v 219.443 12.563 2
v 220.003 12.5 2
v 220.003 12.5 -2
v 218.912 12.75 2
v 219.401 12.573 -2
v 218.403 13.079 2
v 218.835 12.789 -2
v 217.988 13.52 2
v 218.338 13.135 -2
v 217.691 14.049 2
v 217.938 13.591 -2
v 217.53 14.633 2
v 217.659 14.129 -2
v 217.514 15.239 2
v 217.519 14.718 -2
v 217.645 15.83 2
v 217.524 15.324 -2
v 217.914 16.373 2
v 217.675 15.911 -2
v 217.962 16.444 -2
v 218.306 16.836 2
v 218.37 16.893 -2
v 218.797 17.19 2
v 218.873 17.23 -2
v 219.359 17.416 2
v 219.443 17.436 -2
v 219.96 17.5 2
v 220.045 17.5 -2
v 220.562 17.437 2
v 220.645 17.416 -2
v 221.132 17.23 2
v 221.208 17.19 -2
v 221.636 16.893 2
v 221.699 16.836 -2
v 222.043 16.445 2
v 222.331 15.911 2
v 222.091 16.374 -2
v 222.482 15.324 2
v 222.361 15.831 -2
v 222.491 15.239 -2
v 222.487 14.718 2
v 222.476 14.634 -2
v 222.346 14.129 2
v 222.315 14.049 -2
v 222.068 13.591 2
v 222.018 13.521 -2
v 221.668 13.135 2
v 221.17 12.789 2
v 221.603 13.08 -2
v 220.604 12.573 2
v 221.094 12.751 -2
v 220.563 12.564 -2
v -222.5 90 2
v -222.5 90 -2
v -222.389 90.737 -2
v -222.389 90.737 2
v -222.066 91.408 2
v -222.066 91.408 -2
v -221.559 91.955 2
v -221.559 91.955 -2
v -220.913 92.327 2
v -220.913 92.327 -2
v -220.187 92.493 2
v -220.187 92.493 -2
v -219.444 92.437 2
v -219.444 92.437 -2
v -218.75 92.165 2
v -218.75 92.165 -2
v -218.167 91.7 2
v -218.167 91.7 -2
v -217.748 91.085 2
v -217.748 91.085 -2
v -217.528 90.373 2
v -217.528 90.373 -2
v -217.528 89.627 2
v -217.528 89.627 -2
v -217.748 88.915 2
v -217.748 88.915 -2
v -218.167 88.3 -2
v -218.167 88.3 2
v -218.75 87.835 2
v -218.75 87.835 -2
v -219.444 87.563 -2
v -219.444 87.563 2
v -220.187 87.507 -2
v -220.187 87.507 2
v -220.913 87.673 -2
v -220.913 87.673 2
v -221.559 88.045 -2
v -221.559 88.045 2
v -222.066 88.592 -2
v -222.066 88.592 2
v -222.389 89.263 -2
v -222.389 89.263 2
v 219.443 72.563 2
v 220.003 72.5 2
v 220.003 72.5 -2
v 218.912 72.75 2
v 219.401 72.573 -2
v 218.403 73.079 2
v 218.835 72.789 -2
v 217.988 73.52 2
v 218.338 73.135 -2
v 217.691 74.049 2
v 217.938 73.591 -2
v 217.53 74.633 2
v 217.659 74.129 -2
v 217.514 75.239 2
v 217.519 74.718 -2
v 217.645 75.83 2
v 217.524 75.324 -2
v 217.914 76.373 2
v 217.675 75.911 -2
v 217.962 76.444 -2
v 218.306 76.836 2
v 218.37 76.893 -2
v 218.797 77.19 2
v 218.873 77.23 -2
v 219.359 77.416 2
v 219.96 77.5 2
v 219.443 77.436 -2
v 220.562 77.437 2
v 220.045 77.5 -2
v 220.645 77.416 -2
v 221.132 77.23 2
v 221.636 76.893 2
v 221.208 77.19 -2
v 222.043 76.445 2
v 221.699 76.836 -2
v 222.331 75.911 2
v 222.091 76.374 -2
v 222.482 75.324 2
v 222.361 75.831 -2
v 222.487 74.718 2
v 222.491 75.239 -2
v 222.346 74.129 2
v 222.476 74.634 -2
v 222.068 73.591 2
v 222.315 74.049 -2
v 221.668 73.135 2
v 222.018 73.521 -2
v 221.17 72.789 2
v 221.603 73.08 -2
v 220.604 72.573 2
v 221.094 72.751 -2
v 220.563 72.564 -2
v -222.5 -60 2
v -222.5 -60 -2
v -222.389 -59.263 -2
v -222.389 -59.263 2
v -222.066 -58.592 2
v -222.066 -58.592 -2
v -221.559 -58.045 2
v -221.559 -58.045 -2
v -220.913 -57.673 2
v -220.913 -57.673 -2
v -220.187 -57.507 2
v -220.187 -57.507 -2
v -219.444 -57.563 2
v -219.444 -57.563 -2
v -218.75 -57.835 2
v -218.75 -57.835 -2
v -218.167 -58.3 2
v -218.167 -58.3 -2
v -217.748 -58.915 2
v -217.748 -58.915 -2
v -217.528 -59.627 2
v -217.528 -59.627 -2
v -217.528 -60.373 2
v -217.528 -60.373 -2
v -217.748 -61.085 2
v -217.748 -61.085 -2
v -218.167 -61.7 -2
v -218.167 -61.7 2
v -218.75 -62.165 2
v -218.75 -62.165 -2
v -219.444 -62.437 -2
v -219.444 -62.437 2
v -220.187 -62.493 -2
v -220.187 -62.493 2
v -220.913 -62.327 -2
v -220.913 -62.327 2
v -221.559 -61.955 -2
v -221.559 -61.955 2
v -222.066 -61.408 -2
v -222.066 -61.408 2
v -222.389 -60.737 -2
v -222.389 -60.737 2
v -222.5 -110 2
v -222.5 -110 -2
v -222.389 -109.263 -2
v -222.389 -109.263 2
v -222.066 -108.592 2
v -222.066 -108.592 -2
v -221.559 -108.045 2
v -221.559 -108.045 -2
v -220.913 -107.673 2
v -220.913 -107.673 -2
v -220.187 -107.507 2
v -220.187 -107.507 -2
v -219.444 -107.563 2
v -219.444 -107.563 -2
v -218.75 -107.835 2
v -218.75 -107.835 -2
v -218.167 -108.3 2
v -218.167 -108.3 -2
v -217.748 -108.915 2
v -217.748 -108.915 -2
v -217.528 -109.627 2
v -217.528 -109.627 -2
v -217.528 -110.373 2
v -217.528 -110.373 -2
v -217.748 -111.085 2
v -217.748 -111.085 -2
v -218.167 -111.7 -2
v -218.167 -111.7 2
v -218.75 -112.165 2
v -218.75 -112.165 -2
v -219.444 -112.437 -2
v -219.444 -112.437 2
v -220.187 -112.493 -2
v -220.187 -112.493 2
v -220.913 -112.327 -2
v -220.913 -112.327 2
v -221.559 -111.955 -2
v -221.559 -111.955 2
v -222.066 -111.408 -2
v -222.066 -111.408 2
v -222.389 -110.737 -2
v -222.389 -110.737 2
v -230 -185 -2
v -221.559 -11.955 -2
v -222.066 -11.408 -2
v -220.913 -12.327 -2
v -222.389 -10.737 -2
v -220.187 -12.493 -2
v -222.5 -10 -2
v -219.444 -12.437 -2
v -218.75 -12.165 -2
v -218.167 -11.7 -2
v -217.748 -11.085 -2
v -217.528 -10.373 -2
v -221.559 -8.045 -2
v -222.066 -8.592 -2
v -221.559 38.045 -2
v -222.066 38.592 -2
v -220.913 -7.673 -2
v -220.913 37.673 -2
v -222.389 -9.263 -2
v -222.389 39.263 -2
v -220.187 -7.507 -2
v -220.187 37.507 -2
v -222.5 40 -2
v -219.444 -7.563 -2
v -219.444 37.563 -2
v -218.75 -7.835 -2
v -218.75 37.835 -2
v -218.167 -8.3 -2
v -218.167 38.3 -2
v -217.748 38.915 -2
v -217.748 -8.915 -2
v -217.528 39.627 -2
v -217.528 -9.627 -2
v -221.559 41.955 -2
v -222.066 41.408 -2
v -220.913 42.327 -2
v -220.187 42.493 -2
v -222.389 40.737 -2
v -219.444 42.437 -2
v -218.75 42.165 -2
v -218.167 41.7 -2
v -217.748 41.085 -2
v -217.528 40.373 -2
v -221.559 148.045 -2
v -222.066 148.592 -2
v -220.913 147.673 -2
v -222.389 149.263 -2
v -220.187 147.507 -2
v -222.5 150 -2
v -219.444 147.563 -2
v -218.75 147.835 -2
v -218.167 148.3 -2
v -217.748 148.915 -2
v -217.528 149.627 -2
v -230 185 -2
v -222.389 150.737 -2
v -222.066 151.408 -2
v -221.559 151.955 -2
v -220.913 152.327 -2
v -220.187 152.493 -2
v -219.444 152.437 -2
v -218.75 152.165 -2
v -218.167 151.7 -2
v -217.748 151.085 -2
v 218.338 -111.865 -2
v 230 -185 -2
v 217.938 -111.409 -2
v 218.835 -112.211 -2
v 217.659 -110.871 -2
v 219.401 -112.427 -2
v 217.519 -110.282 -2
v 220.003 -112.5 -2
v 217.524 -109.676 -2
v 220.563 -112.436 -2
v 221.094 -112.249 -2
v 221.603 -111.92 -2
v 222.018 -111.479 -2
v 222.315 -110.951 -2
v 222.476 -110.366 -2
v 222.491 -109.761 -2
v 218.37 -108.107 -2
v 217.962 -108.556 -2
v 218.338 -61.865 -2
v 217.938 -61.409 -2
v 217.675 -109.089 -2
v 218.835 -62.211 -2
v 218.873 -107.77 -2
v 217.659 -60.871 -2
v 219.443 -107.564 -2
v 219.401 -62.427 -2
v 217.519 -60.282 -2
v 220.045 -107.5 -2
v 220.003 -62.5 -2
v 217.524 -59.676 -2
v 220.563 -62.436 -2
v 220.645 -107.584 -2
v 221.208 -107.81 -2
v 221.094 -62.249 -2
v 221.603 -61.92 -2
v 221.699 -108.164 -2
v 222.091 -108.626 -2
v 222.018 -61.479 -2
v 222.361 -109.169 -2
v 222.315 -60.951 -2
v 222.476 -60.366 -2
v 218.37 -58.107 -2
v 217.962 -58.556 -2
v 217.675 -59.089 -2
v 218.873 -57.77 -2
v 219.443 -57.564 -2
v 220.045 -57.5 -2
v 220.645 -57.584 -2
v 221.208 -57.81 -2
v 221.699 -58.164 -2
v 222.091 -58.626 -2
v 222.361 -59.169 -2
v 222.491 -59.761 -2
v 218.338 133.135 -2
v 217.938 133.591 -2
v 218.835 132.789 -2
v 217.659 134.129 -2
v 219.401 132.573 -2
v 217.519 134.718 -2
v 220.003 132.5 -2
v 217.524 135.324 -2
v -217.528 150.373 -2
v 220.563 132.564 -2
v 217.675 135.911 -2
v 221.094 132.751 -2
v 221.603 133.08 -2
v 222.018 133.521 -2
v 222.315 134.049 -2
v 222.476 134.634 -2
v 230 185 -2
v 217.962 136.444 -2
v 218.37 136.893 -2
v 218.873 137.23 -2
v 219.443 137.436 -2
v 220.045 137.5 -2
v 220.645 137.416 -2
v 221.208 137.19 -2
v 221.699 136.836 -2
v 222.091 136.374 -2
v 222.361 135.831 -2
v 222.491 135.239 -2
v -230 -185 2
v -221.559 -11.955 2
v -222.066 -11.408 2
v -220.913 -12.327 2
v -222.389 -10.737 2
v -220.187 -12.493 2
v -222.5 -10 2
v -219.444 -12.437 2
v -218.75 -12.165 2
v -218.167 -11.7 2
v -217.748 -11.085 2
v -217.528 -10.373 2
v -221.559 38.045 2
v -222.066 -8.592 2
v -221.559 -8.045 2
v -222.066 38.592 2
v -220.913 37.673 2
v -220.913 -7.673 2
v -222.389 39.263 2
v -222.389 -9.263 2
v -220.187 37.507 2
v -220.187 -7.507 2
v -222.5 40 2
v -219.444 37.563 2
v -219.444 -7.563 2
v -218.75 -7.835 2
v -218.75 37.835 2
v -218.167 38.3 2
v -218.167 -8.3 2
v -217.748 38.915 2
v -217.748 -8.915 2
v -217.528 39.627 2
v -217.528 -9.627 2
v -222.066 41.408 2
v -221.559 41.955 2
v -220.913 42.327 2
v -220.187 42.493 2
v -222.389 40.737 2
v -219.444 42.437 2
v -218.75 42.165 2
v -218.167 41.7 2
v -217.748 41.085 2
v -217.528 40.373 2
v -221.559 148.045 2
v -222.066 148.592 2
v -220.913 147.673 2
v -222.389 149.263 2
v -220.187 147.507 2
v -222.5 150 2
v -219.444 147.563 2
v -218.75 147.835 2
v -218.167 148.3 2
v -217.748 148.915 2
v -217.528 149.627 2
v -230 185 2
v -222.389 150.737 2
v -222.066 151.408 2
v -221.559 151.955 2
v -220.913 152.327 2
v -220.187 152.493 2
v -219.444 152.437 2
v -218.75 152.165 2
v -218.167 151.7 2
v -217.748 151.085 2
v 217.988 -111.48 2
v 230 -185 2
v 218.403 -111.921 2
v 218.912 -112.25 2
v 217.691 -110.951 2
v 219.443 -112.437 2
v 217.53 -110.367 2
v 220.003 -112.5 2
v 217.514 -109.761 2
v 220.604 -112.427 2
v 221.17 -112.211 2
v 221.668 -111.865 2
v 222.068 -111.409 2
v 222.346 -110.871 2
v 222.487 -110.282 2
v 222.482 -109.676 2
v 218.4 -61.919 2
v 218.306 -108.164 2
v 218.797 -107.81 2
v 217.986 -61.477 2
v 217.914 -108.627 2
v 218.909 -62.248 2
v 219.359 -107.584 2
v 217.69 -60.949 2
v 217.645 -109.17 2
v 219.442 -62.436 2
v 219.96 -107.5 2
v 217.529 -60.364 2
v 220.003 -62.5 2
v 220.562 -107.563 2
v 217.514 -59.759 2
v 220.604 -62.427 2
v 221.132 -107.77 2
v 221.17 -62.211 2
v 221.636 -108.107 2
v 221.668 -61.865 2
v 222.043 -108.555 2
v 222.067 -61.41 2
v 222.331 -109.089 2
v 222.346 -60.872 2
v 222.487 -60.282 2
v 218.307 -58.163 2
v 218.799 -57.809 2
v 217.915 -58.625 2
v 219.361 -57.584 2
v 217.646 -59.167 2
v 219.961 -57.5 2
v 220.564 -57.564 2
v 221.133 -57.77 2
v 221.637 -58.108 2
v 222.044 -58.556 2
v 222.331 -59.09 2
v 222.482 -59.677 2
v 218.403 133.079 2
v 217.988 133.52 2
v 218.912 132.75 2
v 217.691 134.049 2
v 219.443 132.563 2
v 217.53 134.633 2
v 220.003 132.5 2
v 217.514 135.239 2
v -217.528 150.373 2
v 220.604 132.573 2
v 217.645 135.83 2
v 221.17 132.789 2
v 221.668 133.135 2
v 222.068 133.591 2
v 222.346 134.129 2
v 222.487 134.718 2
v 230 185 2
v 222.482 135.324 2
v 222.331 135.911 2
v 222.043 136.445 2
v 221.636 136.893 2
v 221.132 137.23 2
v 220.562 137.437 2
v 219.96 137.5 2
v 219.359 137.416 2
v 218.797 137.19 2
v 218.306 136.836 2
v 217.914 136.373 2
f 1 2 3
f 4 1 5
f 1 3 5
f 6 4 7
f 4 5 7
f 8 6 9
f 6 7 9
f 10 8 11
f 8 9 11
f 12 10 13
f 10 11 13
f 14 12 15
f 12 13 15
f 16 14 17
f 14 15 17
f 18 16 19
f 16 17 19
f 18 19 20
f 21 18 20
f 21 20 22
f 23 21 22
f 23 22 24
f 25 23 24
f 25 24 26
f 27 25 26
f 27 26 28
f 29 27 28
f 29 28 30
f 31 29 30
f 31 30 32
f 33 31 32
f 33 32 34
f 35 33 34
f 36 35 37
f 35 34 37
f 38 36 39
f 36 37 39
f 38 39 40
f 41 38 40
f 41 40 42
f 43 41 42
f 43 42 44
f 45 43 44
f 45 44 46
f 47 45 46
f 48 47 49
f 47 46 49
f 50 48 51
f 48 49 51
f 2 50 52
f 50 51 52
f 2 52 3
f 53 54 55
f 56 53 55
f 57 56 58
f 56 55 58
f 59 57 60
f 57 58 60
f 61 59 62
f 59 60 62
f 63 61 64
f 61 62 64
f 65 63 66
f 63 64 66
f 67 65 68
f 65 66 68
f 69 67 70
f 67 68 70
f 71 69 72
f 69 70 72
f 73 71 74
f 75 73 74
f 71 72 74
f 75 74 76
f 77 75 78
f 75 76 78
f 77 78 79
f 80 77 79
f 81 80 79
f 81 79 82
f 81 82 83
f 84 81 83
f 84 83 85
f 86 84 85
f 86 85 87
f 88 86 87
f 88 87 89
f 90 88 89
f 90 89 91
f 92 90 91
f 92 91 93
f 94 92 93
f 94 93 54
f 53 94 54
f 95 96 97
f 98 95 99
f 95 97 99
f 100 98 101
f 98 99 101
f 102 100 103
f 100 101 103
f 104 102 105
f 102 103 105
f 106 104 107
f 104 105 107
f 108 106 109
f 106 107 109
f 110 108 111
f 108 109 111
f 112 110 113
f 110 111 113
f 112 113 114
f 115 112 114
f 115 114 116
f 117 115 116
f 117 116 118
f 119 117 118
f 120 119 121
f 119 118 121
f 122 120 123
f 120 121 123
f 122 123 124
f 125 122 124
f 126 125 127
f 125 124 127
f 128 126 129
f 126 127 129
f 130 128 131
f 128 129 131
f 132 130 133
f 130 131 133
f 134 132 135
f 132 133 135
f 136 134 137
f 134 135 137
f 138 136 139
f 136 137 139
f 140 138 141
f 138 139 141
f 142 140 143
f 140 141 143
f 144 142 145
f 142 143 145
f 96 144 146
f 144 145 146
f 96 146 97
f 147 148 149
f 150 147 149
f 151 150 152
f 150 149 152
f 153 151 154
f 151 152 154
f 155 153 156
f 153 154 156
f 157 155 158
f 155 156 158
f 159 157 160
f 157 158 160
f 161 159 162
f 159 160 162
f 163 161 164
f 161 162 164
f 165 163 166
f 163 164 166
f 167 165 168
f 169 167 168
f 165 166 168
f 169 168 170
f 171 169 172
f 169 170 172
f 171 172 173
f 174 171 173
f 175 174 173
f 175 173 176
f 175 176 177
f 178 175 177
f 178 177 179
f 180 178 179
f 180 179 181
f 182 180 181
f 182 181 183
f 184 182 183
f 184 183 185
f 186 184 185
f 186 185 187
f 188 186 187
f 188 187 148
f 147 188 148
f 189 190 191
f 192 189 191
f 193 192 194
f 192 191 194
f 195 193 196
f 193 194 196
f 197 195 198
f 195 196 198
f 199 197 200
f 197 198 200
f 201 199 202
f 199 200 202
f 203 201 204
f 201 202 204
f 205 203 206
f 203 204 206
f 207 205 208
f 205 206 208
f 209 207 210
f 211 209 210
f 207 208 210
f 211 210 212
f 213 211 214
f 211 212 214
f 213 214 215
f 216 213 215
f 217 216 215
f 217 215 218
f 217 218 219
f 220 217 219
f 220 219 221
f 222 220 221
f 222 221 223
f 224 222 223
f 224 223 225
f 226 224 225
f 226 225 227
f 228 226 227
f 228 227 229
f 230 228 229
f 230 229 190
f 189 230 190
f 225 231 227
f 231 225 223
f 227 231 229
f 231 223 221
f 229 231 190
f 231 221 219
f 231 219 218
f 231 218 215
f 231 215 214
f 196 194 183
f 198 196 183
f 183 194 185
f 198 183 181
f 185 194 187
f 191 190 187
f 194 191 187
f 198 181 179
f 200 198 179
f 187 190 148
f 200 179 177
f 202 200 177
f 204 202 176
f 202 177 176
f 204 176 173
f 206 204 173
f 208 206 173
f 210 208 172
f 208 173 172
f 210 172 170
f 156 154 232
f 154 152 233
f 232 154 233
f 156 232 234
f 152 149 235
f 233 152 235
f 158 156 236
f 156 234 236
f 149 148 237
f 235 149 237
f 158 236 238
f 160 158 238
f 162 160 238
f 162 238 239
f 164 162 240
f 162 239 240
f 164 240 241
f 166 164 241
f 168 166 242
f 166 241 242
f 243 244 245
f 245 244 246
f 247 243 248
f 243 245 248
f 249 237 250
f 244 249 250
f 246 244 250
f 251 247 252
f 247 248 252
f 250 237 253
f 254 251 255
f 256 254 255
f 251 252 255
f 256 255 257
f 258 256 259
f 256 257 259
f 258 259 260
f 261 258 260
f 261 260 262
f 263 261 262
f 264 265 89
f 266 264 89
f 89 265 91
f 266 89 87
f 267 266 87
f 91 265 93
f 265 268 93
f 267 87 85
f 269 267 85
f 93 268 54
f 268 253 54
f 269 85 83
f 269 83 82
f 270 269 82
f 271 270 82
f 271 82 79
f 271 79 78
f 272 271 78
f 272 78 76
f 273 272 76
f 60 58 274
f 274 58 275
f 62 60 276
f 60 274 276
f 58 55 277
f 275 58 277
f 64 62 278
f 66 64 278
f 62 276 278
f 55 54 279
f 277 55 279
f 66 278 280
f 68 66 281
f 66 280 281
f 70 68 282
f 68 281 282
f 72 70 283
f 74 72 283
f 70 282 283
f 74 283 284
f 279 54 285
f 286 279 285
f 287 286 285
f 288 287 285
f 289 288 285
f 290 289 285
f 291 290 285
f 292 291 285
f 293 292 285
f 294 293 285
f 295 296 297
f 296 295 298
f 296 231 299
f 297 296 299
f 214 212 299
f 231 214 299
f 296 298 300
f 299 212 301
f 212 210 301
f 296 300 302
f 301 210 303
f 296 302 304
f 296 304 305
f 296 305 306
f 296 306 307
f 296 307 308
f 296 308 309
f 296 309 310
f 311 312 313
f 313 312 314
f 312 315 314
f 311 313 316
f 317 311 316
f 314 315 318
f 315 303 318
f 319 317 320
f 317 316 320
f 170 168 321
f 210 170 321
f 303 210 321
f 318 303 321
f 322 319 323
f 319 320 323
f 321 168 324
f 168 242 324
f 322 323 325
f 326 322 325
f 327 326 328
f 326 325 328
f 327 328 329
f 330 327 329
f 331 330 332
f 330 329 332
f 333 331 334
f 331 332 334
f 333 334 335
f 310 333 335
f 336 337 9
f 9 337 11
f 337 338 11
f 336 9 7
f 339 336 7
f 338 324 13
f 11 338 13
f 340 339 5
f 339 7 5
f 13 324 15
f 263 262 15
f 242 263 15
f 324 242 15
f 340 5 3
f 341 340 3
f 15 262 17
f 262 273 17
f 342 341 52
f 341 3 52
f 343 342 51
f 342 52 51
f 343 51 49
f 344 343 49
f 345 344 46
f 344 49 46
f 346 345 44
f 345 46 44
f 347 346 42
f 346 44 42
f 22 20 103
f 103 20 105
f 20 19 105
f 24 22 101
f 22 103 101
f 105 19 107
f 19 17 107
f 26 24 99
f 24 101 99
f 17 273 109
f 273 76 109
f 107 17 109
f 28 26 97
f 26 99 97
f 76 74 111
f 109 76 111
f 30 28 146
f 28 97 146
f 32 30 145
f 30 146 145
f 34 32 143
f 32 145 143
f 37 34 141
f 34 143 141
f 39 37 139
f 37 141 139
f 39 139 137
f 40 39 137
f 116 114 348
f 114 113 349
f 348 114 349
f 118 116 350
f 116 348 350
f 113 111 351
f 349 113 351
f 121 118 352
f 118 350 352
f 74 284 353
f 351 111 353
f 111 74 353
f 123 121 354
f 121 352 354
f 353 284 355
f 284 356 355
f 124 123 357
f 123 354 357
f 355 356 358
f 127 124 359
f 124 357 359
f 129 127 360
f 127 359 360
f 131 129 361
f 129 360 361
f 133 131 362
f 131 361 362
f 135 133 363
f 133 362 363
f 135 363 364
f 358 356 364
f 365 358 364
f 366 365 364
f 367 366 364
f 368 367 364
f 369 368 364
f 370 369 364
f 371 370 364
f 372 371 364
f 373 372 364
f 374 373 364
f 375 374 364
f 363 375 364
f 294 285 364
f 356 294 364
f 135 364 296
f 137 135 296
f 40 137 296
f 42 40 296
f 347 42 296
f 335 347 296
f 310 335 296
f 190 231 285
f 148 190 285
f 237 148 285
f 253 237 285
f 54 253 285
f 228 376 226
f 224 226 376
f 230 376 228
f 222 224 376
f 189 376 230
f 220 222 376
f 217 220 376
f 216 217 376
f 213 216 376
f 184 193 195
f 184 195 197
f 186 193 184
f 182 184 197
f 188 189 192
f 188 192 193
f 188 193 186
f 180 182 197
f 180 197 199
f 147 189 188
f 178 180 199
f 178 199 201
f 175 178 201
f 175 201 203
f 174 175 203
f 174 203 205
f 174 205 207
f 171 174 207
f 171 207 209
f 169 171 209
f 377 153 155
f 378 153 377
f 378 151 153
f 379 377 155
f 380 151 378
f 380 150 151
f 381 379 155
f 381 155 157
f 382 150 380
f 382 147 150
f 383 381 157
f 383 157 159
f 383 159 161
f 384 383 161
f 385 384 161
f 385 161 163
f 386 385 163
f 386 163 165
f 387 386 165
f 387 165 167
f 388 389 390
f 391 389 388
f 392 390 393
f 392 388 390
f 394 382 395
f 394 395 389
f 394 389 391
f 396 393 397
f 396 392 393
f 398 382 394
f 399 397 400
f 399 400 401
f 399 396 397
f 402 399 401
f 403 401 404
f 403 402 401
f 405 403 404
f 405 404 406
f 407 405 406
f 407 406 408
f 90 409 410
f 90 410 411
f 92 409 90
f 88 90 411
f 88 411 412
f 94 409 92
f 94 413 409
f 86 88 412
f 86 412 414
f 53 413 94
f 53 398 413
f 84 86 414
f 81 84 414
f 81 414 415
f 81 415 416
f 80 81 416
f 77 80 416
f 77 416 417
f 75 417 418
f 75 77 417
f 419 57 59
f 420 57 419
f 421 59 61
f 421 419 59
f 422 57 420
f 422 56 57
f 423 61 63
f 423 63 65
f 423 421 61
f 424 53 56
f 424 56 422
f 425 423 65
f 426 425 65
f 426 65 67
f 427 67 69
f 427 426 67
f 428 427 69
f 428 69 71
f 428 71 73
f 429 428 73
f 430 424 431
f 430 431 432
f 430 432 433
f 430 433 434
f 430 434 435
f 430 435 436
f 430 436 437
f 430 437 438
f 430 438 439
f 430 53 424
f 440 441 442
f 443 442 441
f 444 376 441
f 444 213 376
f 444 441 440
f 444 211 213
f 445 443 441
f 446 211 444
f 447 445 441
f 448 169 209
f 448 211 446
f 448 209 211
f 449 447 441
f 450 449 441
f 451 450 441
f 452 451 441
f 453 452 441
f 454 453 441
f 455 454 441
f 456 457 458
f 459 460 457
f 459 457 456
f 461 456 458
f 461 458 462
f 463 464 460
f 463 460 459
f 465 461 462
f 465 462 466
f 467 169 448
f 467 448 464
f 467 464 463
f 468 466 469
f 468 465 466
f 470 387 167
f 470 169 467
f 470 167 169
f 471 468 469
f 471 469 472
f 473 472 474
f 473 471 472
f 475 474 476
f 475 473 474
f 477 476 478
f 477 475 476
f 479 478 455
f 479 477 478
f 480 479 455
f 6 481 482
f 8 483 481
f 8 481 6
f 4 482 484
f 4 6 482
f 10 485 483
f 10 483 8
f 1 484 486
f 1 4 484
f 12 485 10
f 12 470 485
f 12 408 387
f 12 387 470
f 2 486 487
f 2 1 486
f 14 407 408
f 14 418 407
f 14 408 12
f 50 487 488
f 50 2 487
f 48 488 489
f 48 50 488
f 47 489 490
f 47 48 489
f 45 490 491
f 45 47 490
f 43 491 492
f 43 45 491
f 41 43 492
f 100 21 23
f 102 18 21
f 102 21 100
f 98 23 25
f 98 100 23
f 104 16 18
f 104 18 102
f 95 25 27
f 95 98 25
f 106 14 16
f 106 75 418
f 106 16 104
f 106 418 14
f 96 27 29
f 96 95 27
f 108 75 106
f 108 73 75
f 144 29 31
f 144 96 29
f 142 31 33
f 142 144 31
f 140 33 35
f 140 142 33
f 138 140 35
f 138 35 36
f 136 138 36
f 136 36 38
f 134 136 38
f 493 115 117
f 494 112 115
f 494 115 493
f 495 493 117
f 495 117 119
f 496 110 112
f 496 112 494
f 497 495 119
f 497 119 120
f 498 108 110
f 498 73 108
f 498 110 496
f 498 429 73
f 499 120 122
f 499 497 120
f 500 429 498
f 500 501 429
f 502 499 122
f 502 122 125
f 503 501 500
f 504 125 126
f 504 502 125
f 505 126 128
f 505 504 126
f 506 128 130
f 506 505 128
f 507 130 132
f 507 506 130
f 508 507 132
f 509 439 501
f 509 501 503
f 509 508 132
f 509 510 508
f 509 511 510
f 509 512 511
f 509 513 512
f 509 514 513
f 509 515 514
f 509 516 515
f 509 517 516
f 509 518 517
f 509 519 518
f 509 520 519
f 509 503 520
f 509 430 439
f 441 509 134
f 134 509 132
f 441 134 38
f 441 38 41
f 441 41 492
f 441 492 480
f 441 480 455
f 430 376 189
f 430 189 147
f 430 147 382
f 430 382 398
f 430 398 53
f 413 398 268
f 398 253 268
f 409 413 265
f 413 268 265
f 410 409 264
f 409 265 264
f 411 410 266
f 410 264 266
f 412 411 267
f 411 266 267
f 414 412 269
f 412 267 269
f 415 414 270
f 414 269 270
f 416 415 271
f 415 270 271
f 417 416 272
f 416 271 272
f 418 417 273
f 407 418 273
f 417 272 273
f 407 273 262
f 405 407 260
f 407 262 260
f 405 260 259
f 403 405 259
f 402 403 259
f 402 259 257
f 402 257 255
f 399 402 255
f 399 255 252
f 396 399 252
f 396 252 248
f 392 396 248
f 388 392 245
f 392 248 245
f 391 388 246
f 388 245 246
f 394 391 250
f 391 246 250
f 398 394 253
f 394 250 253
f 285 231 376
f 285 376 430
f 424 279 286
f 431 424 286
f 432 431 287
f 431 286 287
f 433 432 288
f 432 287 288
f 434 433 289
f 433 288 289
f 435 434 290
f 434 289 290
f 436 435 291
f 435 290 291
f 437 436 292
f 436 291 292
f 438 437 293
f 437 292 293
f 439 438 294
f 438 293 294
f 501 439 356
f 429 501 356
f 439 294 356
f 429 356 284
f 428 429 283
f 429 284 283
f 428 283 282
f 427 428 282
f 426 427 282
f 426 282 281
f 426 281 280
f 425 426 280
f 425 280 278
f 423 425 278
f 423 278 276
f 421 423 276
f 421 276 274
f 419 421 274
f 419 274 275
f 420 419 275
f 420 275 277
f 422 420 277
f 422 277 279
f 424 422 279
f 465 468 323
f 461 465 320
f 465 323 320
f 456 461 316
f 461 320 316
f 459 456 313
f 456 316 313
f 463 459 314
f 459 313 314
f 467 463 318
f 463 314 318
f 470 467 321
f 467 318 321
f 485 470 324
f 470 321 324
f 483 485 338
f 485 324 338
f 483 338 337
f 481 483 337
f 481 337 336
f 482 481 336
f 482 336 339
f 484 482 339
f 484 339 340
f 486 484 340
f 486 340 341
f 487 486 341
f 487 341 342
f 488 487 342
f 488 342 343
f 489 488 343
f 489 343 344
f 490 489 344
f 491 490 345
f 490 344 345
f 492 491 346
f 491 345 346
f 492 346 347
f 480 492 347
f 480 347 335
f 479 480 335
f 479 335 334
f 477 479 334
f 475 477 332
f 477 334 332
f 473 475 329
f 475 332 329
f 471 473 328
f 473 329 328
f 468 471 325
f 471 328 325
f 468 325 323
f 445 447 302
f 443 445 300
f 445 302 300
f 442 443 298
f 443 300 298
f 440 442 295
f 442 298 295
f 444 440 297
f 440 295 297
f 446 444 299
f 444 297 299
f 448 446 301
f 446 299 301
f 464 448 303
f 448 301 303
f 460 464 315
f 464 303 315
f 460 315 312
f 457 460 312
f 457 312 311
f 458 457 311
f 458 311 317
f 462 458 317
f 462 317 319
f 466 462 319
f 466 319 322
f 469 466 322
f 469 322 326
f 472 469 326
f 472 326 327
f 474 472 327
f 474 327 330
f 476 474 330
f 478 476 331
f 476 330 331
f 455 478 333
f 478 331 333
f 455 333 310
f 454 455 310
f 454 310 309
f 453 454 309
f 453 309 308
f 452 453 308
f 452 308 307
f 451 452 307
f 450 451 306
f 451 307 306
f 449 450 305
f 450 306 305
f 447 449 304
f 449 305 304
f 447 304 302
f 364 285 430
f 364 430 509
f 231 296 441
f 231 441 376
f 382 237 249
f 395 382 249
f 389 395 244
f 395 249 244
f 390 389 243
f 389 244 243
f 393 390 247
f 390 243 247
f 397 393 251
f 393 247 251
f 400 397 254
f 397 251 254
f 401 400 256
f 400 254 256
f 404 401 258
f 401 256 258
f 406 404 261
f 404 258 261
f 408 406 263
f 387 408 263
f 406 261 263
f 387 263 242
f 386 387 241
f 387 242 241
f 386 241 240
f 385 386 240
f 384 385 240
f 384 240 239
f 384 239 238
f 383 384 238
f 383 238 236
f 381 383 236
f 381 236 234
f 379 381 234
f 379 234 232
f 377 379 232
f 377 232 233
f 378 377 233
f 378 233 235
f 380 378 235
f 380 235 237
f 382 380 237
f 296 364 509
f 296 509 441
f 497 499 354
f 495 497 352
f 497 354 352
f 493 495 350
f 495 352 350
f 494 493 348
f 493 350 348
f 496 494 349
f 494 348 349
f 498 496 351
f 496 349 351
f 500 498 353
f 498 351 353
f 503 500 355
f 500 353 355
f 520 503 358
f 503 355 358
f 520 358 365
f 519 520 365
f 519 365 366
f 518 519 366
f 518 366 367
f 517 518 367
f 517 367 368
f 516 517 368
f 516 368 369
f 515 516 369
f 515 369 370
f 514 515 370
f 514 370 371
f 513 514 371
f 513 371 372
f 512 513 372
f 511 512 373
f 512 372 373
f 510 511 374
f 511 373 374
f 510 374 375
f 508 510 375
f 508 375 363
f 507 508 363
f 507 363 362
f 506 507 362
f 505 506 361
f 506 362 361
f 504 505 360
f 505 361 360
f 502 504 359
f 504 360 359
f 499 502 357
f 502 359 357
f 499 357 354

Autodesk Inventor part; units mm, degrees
ref_plane "YZ Plane" through (0, 0, 0) normal (1, 0, 0) x (0, 1, 0)
ref_plane "XZ Plane" through (0, 0, 0) normal (0, 1, 0) x (-1, 0, 0)
ref_plane "XY Plane" through (0, 0, 0) normal (0, 0, 1) x (1, 0, 0)
sketch "Эскиз1" plane through (0, 0, 0) normal (0, 0, 1) x (1, 0, 0)
  line L0 (230, 185) -> (230, -185)
  line L1 (230, -185) -> (-230, -185)
  line L2 (-230, -185) -> (-230, 185)
  line L3 (-230, 185) -> (230, -185) construction
  line L4 (230, 185) -> (-230, -185) construction
  line L5 (-322, 0) -> (322, 0) construction
  line L6 (0, 259) -> (0, -259) construction
  line L7 (-230, 185) -> (230, 185)
  point P0 (0, 0)
  dimension "d2" = 370
  dimension "d4" = 460
extrude "Выдавливание1" add sketch "Эскиз1" along normal mid plane 4
sketch "Эскиз3" plane through (0, 0, -2) normal (0, 0, -1) x (-1, 0, 0)
  circle A0 centre (220, 150) radius 2.5
  circle A1 centre (220, 90) radius 2.5
  circle A2 centre (220, 40) radius 2.5
  circle A3 centre (220, -10) radius 2.5
  circle A4 centre (220, -60) radius 2.5
  circle A5 centre (220, -110) radius 2.5
  ellipse E0 centre (-220.0027, 135) end of major axis (-220.0027, 132.5) minor radius 2.5
  ellipse E1 centre (-220.0027, 75) end of major axis (-220.0027, 72.5) minor radius 2.5
  ellipse E2 centre (-220.0027, 15) end of major axis (-220.0027, 12.5) minor radius 2.5
  ellipse E3 centre (-220.0027, -60) end of major axis (-220.0027, -62.5) minor radius 2.5
  ellipse E4 centre (-220.0027, -110) end of major axis (-220.0027, -112.5) minor radius 2.5
  point P0 (0, 0)
extrude "Выдавливание3" cut sketch "Эскиз3" against normal up to next
properties part number "Боковая часть корпуса"
